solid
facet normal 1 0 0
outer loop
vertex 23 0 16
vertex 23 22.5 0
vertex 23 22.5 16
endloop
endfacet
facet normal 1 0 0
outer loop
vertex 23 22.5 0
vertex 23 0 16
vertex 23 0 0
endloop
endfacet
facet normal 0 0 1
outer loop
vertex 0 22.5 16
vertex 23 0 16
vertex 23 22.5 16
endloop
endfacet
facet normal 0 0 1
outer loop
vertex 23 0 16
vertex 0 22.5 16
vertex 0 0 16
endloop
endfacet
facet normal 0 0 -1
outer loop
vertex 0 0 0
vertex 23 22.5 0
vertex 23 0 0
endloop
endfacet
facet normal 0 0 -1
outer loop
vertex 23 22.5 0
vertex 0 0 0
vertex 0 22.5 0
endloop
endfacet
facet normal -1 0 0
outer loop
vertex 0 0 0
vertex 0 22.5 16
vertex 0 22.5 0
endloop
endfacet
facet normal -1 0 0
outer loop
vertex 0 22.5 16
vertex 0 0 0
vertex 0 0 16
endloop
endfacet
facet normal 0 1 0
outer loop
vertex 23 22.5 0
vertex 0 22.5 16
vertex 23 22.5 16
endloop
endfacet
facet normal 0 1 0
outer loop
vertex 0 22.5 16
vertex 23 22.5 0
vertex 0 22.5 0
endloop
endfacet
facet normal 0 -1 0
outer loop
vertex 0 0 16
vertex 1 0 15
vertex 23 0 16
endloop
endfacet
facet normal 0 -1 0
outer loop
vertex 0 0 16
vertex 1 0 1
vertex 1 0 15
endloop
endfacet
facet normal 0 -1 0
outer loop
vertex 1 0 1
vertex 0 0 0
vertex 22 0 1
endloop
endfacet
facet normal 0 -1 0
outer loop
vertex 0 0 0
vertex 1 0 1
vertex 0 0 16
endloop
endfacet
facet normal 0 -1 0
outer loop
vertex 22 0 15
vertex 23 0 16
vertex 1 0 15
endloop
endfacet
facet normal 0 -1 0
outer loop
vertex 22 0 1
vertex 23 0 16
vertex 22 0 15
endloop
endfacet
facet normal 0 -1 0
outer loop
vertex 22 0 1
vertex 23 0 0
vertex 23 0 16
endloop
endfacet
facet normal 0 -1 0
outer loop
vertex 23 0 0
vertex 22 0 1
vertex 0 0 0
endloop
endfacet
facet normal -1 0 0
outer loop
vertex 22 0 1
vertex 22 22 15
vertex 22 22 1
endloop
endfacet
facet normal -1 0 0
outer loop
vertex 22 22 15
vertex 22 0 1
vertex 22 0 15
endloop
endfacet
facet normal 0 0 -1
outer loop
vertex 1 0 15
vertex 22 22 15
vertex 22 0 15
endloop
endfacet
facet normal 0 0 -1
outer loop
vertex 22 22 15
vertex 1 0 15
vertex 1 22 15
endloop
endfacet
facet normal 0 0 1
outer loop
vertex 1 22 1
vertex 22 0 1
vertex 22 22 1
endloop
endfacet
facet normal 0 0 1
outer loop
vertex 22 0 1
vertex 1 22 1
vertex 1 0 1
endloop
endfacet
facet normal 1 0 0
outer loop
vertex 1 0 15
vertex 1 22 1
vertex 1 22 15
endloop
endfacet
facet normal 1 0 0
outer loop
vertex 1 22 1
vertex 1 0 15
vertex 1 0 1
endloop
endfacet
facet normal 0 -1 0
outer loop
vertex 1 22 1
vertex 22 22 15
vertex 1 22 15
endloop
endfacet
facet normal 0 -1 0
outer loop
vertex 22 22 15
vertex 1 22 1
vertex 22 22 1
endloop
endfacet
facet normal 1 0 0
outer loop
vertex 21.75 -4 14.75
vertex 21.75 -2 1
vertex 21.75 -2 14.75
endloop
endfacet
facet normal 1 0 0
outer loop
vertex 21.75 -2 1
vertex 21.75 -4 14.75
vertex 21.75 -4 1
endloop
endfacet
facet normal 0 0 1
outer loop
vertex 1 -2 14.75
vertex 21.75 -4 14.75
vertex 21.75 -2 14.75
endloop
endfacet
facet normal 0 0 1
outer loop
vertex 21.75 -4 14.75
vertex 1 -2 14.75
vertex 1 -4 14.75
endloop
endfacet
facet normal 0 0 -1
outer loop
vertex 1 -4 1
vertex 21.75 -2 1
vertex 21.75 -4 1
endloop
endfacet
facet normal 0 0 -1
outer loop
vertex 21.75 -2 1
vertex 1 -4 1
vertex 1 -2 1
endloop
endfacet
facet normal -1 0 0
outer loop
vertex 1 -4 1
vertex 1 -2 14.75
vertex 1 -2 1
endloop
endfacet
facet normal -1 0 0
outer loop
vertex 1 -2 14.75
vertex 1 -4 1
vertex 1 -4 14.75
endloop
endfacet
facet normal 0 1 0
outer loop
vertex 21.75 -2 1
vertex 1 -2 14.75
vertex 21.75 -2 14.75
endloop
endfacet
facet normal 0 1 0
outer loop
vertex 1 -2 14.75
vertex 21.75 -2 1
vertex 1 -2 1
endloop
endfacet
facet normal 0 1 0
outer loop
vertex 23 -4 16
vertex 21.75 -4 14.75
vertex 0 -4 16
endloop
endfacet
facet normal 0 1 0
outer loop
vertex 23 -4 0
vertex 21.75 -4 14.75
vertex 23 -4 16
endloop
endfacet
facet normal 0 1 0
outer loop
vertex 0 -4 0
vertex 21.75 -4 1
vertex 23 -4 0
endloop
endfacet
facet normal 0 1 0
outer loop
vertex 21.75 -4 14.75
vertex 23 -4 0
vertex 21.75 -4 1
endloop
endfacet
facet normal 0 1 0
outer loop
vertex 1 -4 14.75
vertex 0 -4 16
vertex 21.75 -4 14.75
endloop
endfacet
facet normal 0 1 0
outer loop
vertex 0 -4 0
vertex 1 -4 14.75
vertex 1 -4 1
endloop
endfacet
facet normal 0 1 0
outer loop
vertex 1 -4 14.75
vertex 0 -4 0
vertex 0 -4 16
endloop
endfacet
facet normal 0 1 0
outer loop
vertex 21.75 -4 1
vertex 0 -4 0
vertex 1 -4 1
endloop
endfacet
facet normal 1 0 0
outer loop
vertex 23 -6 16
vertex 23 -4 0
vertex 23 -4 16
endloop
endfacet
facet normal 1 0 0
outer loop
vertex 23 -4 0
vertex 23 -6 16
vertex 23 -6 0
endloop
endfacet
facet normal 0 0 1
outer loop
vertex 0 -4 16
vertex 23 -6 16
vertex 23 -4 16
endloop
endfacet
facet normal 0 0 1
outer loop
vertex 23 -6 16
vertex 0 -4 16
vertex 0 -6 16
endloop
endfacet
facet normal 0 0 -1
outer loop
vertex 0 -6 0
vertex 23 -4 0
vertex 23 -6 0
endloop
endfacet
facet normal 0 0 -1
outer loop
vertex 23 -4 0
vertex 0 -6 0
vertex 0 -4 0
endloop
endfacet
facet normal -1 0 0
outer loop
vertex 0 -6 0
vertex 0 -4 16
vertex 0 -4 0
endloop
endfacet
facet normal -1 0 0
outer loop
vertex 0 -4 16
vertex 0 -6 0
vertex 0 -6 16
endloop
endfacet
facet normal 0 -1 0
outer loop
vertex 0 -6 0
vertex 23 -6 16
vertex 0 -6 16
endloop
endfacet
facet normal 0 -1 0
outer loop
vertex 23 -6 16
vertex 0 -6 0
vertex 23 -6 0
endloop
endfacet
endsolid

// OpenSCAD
a = 16;//höhe
b = 23;//breite

difference(){
    cube([b, 22.5, a], false);
    translate([1, -1, 1]){
        cube([b-2, 23, a-2], false);
    }
    /*translate([4.25, 0.25, 2]){
        cube([13.5, 22.5, 3.5], false);
    }*/
}



//lid
translate([1, -4, 1]){
    cube([b-2.25, 2, a-2.25], false);
}
translate([0, -6, 0]){
    cube([b, 2, a], false);
}
